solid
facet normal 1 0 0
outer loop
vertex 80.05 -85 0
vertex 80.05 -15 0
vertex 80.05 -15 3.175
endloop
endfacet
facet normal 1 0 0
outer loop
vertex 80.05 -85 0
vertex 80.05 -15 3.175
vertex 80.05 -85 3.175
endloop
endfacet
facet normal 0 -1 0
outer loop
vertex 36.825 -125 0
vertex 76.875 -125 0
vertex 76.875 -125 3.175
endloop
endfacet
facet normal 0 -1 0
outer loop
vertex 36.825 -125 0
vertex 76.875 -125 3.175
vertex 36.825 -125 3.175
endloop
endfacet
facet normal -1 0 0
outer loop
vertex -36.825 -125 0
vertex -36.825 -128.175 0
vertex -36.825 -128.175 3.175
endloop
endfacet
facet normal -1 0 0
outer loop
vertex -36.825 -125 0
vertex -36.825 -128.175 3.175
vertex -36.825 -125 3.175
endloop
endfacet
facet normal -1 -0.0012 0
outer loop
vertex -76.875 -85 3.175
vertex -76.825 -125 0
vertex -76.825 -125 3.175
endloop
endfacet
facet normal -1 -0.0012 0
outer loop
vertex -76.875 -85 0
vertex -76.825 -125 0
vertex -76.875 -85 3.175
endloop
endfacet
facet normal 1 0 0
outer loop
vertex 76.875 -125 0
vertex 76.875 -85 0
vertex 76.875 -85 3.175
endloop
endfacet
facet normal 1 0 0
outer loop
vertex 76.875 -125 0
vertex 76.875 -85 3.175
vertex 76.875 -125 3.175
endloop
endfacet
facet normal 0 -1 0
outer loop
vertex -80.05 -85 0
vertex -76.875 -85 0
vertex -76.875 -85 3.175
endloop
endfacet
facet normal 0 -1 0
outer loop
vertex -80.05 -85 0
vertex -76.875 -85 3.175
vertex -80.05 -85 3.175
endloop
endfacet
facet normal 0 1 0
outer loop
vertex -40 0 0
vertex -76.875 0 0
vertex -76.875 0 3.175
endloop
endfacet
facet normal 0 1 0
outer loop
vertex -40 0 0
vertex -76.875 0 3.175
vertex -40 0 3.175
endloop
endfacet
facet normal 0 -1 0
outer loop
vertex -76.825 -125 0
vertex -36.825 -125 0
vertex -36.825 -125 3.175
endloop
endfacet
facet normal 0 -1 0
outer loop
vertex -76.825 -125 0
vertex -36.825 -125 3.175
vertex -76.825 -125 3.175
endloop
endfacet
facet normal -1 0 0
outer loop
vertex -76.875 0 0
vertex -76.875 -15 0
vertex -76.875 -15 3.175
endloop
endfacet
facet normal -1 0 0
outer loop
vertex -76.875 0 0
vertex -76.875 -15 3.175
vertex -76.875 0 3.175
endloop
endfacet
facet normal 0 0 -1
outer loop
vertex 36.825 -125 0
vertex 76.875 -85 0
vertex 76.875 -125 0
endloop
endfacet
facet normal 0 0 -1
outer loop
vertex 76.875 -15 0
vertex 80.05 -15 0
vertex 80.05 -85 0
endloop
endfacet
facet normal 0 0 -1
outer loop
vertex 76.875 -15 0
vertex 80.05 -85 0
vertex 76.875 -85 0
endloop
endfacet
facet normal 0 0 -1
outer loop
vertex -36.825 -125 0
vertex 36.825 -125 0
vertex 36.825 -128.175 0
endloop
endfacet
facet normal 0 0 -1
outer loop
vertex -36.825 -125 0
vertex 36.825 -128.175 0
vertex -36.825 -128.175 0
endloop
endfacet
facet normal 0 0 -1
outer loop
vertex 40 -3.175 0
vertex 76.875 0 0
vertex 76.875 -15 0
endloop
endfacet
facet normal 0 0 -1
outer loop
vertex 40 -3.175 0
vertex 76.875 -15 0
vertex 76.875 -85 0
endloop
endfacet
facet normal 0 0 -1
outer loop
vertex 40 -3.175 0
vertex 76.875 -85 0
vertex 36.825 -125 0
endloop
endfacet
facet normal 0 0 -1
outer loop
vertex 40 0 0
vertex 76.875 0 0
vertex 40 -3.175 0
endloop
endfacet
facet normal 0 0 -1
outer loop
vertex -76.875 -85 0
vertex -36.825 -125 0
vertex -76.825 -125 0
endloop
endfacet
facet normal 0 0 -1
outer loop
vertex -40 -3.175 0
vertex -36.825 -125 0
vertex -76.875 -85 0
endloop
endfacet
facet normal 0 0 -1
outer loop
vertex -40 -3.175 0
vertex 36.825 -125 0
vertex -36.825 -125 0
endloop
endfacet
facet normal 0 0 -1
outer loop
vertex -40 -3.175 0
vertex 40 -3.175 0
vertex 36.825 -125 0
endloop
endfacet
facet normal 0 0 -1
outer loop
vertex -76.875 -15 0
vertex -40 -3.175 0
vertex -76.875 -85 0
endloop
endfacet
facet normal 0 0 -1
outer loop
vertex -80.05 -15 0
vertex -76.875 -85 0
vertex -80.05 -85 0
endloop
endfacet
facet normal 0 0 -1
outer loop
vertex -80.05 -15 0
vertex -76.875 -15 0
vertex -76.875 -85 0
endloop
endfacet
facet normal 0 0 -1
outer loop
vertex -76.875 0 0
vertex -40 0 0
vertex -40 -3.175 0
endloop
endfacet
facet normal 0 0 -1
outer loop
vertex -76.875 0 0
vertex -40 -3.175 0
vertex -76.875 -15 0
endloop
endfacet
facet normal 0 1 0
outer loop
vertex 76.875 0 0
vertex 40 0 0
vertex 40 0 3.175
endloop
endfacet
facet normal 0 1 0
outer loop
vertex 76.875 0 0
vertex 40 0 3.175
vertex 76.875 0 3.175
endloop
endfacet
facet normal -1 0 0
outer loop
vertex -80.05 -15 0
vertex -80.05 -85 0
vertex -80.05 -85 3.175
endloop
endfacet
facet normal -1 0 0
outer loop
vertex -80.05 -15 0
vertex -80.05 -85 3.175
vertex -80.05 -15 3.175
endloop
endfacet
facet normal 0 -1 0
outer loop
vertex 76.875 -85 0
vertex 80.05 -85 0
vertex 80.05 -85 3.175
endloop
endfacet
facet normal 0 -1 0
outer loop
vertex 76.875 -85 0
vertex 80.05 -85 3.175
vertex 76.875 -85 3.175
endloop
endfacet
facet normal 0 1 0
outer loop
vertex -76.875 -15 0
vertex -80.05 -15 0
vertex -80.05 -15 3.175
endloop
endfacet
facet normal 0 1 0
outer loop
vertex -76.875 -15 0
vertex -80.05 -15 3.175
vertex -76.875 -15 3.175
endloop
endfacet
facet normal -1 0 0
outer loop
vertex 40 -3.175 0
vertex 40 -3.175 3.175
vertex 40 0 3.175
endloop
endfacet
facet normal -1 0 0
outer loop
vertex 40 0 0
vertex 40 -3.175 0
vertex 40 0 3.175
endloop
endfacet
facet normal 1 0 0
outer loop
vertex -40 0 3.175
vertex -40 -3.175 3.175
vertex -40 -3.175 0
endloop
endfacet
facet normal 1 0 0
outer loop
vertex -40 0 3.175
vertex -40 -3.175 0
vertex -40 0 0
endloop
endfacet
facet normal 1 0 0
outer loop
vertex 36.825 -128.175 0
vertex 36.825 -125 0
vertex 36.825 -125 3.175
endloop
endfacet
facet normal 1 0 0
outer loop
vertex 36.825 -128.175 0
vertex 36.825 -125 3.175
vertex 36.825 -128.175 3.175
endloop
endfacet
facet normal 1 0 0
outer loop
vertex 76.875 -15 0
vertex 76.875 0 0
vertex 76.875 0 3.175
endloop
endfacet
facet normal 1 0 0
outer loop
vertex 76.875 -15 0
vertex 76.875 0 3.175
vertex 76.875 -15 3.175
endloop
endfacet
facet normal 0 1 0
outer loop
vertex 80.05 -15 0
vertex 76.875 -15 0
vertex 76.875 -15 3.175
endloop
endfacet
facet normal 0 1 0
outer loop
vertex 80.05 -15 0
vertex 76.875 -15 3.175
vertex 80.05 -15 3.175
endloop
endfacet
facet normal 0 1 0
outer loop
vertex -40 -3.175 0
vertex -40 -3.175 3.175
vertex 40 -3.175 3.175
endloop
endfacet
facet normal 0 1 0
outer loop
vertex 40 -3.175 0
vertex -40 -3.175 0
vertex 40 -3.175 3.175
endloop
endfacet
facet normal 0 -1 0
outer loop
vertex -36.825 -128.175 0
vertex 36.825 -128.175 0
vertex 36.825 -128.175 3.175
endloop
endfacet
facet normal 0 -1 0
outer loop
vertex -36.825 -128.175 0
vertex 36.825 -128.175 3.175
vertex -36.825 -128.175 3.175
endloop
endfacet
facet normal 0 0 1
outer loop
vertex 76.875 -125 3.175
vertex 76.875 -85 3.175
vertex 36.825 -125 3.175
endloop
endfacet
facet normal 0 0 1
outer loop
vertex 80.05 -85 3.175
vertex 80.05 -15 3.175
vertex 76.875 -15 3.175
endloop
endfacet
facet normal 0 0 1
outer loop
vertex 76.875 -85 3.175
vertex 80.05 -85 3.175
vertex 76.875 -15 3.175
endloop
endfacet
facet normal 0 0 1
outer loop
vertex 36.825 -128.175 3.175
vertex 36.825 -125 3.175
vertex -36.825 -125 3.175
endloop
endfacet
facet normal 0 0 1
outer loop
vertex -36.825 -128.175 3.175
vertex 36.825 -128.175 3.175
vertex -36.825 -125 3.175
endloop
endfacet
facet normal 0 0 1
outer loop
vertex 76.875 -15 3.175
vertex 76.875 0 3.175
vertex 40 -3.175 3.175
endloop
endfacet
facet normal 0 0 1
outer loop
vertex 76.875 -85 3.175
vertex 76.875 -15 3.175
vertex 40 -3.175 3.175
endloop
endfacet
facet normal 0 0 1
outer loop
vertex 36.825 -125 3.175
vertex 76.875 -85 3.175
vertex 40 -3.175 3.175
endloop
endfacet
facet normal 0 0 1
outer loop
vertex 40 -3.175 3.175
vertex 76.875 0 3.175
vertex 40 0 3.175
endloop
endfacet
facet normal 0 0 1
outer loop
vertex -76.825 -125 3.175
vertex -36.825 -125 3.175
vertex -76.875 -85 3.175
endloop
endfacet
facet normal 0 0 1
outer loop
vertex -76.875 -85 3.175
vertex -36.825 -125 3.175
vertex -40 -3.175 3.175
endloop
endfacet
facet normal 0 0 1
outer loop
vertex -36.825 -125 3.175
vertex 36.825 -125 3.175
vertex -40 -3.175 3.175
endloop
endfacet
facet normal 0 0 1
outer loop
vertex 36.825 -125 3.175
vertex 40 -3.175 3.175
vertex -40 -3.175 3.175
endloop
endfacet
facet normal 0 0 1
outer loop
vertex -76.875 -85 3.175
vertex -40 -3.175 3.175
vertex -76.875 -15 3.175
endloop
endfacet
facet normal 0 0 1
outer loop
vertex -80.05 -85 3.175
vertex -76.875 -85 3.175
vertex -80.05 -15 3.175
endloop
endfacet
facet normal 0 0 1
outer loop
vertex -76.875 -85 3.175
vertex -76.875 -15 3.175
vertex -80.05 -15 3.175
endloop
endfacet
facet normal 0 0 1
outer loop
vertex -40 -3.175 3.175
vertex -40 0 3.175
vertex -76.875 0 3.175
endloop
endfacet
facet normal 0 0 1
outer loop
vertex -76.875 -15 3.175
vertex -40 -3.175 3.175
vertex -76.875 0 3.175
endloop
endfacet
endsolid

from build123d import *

# Parameters (mm, degrees)
BOSS_EXTRUDE2_DEPTH = 3.175
SKETCH2_W           = 80
SKETCH2_H           = 3.175
CUT_EXTRUDE1_DEPTH  = 4.175


with BuildPart() as part:
    # Sketch1 → Boss-Extrude2 (new body)
    with BuildSketch(Plane.XY):
        Polygon((-76.875, 0), (76.875, 0), (76.875, -15), (80.05, -15), (80.05, -85), (76.875, -85), (76.875, -124.99996875), (36.825, -124.99996875), (36.825, -128.17496875), (-36.825, -128.17496875), (-36.825, -124.99996875), (-76.825, -124.99996875), (-76.875, -85), (-80.05, -85), (-80.05, -15), (-76.875, -15), align=None)
    extrude(amount=BOSS_EXTRUDE2_DEPTH)

    # Sketch2 → Cut-Extrude1 (cut, through all)
    with BuildSketch(Plane.XY.offset(3.175)):
        with Locations((0, -1.5875)):
            Rectangle(SKETCH2_W, SKETCH2_H)
    extrude(amount=-CUT_EXTRUDE1_DEPTH, mode=Mode.SUBTRACT)


solid = part.part
